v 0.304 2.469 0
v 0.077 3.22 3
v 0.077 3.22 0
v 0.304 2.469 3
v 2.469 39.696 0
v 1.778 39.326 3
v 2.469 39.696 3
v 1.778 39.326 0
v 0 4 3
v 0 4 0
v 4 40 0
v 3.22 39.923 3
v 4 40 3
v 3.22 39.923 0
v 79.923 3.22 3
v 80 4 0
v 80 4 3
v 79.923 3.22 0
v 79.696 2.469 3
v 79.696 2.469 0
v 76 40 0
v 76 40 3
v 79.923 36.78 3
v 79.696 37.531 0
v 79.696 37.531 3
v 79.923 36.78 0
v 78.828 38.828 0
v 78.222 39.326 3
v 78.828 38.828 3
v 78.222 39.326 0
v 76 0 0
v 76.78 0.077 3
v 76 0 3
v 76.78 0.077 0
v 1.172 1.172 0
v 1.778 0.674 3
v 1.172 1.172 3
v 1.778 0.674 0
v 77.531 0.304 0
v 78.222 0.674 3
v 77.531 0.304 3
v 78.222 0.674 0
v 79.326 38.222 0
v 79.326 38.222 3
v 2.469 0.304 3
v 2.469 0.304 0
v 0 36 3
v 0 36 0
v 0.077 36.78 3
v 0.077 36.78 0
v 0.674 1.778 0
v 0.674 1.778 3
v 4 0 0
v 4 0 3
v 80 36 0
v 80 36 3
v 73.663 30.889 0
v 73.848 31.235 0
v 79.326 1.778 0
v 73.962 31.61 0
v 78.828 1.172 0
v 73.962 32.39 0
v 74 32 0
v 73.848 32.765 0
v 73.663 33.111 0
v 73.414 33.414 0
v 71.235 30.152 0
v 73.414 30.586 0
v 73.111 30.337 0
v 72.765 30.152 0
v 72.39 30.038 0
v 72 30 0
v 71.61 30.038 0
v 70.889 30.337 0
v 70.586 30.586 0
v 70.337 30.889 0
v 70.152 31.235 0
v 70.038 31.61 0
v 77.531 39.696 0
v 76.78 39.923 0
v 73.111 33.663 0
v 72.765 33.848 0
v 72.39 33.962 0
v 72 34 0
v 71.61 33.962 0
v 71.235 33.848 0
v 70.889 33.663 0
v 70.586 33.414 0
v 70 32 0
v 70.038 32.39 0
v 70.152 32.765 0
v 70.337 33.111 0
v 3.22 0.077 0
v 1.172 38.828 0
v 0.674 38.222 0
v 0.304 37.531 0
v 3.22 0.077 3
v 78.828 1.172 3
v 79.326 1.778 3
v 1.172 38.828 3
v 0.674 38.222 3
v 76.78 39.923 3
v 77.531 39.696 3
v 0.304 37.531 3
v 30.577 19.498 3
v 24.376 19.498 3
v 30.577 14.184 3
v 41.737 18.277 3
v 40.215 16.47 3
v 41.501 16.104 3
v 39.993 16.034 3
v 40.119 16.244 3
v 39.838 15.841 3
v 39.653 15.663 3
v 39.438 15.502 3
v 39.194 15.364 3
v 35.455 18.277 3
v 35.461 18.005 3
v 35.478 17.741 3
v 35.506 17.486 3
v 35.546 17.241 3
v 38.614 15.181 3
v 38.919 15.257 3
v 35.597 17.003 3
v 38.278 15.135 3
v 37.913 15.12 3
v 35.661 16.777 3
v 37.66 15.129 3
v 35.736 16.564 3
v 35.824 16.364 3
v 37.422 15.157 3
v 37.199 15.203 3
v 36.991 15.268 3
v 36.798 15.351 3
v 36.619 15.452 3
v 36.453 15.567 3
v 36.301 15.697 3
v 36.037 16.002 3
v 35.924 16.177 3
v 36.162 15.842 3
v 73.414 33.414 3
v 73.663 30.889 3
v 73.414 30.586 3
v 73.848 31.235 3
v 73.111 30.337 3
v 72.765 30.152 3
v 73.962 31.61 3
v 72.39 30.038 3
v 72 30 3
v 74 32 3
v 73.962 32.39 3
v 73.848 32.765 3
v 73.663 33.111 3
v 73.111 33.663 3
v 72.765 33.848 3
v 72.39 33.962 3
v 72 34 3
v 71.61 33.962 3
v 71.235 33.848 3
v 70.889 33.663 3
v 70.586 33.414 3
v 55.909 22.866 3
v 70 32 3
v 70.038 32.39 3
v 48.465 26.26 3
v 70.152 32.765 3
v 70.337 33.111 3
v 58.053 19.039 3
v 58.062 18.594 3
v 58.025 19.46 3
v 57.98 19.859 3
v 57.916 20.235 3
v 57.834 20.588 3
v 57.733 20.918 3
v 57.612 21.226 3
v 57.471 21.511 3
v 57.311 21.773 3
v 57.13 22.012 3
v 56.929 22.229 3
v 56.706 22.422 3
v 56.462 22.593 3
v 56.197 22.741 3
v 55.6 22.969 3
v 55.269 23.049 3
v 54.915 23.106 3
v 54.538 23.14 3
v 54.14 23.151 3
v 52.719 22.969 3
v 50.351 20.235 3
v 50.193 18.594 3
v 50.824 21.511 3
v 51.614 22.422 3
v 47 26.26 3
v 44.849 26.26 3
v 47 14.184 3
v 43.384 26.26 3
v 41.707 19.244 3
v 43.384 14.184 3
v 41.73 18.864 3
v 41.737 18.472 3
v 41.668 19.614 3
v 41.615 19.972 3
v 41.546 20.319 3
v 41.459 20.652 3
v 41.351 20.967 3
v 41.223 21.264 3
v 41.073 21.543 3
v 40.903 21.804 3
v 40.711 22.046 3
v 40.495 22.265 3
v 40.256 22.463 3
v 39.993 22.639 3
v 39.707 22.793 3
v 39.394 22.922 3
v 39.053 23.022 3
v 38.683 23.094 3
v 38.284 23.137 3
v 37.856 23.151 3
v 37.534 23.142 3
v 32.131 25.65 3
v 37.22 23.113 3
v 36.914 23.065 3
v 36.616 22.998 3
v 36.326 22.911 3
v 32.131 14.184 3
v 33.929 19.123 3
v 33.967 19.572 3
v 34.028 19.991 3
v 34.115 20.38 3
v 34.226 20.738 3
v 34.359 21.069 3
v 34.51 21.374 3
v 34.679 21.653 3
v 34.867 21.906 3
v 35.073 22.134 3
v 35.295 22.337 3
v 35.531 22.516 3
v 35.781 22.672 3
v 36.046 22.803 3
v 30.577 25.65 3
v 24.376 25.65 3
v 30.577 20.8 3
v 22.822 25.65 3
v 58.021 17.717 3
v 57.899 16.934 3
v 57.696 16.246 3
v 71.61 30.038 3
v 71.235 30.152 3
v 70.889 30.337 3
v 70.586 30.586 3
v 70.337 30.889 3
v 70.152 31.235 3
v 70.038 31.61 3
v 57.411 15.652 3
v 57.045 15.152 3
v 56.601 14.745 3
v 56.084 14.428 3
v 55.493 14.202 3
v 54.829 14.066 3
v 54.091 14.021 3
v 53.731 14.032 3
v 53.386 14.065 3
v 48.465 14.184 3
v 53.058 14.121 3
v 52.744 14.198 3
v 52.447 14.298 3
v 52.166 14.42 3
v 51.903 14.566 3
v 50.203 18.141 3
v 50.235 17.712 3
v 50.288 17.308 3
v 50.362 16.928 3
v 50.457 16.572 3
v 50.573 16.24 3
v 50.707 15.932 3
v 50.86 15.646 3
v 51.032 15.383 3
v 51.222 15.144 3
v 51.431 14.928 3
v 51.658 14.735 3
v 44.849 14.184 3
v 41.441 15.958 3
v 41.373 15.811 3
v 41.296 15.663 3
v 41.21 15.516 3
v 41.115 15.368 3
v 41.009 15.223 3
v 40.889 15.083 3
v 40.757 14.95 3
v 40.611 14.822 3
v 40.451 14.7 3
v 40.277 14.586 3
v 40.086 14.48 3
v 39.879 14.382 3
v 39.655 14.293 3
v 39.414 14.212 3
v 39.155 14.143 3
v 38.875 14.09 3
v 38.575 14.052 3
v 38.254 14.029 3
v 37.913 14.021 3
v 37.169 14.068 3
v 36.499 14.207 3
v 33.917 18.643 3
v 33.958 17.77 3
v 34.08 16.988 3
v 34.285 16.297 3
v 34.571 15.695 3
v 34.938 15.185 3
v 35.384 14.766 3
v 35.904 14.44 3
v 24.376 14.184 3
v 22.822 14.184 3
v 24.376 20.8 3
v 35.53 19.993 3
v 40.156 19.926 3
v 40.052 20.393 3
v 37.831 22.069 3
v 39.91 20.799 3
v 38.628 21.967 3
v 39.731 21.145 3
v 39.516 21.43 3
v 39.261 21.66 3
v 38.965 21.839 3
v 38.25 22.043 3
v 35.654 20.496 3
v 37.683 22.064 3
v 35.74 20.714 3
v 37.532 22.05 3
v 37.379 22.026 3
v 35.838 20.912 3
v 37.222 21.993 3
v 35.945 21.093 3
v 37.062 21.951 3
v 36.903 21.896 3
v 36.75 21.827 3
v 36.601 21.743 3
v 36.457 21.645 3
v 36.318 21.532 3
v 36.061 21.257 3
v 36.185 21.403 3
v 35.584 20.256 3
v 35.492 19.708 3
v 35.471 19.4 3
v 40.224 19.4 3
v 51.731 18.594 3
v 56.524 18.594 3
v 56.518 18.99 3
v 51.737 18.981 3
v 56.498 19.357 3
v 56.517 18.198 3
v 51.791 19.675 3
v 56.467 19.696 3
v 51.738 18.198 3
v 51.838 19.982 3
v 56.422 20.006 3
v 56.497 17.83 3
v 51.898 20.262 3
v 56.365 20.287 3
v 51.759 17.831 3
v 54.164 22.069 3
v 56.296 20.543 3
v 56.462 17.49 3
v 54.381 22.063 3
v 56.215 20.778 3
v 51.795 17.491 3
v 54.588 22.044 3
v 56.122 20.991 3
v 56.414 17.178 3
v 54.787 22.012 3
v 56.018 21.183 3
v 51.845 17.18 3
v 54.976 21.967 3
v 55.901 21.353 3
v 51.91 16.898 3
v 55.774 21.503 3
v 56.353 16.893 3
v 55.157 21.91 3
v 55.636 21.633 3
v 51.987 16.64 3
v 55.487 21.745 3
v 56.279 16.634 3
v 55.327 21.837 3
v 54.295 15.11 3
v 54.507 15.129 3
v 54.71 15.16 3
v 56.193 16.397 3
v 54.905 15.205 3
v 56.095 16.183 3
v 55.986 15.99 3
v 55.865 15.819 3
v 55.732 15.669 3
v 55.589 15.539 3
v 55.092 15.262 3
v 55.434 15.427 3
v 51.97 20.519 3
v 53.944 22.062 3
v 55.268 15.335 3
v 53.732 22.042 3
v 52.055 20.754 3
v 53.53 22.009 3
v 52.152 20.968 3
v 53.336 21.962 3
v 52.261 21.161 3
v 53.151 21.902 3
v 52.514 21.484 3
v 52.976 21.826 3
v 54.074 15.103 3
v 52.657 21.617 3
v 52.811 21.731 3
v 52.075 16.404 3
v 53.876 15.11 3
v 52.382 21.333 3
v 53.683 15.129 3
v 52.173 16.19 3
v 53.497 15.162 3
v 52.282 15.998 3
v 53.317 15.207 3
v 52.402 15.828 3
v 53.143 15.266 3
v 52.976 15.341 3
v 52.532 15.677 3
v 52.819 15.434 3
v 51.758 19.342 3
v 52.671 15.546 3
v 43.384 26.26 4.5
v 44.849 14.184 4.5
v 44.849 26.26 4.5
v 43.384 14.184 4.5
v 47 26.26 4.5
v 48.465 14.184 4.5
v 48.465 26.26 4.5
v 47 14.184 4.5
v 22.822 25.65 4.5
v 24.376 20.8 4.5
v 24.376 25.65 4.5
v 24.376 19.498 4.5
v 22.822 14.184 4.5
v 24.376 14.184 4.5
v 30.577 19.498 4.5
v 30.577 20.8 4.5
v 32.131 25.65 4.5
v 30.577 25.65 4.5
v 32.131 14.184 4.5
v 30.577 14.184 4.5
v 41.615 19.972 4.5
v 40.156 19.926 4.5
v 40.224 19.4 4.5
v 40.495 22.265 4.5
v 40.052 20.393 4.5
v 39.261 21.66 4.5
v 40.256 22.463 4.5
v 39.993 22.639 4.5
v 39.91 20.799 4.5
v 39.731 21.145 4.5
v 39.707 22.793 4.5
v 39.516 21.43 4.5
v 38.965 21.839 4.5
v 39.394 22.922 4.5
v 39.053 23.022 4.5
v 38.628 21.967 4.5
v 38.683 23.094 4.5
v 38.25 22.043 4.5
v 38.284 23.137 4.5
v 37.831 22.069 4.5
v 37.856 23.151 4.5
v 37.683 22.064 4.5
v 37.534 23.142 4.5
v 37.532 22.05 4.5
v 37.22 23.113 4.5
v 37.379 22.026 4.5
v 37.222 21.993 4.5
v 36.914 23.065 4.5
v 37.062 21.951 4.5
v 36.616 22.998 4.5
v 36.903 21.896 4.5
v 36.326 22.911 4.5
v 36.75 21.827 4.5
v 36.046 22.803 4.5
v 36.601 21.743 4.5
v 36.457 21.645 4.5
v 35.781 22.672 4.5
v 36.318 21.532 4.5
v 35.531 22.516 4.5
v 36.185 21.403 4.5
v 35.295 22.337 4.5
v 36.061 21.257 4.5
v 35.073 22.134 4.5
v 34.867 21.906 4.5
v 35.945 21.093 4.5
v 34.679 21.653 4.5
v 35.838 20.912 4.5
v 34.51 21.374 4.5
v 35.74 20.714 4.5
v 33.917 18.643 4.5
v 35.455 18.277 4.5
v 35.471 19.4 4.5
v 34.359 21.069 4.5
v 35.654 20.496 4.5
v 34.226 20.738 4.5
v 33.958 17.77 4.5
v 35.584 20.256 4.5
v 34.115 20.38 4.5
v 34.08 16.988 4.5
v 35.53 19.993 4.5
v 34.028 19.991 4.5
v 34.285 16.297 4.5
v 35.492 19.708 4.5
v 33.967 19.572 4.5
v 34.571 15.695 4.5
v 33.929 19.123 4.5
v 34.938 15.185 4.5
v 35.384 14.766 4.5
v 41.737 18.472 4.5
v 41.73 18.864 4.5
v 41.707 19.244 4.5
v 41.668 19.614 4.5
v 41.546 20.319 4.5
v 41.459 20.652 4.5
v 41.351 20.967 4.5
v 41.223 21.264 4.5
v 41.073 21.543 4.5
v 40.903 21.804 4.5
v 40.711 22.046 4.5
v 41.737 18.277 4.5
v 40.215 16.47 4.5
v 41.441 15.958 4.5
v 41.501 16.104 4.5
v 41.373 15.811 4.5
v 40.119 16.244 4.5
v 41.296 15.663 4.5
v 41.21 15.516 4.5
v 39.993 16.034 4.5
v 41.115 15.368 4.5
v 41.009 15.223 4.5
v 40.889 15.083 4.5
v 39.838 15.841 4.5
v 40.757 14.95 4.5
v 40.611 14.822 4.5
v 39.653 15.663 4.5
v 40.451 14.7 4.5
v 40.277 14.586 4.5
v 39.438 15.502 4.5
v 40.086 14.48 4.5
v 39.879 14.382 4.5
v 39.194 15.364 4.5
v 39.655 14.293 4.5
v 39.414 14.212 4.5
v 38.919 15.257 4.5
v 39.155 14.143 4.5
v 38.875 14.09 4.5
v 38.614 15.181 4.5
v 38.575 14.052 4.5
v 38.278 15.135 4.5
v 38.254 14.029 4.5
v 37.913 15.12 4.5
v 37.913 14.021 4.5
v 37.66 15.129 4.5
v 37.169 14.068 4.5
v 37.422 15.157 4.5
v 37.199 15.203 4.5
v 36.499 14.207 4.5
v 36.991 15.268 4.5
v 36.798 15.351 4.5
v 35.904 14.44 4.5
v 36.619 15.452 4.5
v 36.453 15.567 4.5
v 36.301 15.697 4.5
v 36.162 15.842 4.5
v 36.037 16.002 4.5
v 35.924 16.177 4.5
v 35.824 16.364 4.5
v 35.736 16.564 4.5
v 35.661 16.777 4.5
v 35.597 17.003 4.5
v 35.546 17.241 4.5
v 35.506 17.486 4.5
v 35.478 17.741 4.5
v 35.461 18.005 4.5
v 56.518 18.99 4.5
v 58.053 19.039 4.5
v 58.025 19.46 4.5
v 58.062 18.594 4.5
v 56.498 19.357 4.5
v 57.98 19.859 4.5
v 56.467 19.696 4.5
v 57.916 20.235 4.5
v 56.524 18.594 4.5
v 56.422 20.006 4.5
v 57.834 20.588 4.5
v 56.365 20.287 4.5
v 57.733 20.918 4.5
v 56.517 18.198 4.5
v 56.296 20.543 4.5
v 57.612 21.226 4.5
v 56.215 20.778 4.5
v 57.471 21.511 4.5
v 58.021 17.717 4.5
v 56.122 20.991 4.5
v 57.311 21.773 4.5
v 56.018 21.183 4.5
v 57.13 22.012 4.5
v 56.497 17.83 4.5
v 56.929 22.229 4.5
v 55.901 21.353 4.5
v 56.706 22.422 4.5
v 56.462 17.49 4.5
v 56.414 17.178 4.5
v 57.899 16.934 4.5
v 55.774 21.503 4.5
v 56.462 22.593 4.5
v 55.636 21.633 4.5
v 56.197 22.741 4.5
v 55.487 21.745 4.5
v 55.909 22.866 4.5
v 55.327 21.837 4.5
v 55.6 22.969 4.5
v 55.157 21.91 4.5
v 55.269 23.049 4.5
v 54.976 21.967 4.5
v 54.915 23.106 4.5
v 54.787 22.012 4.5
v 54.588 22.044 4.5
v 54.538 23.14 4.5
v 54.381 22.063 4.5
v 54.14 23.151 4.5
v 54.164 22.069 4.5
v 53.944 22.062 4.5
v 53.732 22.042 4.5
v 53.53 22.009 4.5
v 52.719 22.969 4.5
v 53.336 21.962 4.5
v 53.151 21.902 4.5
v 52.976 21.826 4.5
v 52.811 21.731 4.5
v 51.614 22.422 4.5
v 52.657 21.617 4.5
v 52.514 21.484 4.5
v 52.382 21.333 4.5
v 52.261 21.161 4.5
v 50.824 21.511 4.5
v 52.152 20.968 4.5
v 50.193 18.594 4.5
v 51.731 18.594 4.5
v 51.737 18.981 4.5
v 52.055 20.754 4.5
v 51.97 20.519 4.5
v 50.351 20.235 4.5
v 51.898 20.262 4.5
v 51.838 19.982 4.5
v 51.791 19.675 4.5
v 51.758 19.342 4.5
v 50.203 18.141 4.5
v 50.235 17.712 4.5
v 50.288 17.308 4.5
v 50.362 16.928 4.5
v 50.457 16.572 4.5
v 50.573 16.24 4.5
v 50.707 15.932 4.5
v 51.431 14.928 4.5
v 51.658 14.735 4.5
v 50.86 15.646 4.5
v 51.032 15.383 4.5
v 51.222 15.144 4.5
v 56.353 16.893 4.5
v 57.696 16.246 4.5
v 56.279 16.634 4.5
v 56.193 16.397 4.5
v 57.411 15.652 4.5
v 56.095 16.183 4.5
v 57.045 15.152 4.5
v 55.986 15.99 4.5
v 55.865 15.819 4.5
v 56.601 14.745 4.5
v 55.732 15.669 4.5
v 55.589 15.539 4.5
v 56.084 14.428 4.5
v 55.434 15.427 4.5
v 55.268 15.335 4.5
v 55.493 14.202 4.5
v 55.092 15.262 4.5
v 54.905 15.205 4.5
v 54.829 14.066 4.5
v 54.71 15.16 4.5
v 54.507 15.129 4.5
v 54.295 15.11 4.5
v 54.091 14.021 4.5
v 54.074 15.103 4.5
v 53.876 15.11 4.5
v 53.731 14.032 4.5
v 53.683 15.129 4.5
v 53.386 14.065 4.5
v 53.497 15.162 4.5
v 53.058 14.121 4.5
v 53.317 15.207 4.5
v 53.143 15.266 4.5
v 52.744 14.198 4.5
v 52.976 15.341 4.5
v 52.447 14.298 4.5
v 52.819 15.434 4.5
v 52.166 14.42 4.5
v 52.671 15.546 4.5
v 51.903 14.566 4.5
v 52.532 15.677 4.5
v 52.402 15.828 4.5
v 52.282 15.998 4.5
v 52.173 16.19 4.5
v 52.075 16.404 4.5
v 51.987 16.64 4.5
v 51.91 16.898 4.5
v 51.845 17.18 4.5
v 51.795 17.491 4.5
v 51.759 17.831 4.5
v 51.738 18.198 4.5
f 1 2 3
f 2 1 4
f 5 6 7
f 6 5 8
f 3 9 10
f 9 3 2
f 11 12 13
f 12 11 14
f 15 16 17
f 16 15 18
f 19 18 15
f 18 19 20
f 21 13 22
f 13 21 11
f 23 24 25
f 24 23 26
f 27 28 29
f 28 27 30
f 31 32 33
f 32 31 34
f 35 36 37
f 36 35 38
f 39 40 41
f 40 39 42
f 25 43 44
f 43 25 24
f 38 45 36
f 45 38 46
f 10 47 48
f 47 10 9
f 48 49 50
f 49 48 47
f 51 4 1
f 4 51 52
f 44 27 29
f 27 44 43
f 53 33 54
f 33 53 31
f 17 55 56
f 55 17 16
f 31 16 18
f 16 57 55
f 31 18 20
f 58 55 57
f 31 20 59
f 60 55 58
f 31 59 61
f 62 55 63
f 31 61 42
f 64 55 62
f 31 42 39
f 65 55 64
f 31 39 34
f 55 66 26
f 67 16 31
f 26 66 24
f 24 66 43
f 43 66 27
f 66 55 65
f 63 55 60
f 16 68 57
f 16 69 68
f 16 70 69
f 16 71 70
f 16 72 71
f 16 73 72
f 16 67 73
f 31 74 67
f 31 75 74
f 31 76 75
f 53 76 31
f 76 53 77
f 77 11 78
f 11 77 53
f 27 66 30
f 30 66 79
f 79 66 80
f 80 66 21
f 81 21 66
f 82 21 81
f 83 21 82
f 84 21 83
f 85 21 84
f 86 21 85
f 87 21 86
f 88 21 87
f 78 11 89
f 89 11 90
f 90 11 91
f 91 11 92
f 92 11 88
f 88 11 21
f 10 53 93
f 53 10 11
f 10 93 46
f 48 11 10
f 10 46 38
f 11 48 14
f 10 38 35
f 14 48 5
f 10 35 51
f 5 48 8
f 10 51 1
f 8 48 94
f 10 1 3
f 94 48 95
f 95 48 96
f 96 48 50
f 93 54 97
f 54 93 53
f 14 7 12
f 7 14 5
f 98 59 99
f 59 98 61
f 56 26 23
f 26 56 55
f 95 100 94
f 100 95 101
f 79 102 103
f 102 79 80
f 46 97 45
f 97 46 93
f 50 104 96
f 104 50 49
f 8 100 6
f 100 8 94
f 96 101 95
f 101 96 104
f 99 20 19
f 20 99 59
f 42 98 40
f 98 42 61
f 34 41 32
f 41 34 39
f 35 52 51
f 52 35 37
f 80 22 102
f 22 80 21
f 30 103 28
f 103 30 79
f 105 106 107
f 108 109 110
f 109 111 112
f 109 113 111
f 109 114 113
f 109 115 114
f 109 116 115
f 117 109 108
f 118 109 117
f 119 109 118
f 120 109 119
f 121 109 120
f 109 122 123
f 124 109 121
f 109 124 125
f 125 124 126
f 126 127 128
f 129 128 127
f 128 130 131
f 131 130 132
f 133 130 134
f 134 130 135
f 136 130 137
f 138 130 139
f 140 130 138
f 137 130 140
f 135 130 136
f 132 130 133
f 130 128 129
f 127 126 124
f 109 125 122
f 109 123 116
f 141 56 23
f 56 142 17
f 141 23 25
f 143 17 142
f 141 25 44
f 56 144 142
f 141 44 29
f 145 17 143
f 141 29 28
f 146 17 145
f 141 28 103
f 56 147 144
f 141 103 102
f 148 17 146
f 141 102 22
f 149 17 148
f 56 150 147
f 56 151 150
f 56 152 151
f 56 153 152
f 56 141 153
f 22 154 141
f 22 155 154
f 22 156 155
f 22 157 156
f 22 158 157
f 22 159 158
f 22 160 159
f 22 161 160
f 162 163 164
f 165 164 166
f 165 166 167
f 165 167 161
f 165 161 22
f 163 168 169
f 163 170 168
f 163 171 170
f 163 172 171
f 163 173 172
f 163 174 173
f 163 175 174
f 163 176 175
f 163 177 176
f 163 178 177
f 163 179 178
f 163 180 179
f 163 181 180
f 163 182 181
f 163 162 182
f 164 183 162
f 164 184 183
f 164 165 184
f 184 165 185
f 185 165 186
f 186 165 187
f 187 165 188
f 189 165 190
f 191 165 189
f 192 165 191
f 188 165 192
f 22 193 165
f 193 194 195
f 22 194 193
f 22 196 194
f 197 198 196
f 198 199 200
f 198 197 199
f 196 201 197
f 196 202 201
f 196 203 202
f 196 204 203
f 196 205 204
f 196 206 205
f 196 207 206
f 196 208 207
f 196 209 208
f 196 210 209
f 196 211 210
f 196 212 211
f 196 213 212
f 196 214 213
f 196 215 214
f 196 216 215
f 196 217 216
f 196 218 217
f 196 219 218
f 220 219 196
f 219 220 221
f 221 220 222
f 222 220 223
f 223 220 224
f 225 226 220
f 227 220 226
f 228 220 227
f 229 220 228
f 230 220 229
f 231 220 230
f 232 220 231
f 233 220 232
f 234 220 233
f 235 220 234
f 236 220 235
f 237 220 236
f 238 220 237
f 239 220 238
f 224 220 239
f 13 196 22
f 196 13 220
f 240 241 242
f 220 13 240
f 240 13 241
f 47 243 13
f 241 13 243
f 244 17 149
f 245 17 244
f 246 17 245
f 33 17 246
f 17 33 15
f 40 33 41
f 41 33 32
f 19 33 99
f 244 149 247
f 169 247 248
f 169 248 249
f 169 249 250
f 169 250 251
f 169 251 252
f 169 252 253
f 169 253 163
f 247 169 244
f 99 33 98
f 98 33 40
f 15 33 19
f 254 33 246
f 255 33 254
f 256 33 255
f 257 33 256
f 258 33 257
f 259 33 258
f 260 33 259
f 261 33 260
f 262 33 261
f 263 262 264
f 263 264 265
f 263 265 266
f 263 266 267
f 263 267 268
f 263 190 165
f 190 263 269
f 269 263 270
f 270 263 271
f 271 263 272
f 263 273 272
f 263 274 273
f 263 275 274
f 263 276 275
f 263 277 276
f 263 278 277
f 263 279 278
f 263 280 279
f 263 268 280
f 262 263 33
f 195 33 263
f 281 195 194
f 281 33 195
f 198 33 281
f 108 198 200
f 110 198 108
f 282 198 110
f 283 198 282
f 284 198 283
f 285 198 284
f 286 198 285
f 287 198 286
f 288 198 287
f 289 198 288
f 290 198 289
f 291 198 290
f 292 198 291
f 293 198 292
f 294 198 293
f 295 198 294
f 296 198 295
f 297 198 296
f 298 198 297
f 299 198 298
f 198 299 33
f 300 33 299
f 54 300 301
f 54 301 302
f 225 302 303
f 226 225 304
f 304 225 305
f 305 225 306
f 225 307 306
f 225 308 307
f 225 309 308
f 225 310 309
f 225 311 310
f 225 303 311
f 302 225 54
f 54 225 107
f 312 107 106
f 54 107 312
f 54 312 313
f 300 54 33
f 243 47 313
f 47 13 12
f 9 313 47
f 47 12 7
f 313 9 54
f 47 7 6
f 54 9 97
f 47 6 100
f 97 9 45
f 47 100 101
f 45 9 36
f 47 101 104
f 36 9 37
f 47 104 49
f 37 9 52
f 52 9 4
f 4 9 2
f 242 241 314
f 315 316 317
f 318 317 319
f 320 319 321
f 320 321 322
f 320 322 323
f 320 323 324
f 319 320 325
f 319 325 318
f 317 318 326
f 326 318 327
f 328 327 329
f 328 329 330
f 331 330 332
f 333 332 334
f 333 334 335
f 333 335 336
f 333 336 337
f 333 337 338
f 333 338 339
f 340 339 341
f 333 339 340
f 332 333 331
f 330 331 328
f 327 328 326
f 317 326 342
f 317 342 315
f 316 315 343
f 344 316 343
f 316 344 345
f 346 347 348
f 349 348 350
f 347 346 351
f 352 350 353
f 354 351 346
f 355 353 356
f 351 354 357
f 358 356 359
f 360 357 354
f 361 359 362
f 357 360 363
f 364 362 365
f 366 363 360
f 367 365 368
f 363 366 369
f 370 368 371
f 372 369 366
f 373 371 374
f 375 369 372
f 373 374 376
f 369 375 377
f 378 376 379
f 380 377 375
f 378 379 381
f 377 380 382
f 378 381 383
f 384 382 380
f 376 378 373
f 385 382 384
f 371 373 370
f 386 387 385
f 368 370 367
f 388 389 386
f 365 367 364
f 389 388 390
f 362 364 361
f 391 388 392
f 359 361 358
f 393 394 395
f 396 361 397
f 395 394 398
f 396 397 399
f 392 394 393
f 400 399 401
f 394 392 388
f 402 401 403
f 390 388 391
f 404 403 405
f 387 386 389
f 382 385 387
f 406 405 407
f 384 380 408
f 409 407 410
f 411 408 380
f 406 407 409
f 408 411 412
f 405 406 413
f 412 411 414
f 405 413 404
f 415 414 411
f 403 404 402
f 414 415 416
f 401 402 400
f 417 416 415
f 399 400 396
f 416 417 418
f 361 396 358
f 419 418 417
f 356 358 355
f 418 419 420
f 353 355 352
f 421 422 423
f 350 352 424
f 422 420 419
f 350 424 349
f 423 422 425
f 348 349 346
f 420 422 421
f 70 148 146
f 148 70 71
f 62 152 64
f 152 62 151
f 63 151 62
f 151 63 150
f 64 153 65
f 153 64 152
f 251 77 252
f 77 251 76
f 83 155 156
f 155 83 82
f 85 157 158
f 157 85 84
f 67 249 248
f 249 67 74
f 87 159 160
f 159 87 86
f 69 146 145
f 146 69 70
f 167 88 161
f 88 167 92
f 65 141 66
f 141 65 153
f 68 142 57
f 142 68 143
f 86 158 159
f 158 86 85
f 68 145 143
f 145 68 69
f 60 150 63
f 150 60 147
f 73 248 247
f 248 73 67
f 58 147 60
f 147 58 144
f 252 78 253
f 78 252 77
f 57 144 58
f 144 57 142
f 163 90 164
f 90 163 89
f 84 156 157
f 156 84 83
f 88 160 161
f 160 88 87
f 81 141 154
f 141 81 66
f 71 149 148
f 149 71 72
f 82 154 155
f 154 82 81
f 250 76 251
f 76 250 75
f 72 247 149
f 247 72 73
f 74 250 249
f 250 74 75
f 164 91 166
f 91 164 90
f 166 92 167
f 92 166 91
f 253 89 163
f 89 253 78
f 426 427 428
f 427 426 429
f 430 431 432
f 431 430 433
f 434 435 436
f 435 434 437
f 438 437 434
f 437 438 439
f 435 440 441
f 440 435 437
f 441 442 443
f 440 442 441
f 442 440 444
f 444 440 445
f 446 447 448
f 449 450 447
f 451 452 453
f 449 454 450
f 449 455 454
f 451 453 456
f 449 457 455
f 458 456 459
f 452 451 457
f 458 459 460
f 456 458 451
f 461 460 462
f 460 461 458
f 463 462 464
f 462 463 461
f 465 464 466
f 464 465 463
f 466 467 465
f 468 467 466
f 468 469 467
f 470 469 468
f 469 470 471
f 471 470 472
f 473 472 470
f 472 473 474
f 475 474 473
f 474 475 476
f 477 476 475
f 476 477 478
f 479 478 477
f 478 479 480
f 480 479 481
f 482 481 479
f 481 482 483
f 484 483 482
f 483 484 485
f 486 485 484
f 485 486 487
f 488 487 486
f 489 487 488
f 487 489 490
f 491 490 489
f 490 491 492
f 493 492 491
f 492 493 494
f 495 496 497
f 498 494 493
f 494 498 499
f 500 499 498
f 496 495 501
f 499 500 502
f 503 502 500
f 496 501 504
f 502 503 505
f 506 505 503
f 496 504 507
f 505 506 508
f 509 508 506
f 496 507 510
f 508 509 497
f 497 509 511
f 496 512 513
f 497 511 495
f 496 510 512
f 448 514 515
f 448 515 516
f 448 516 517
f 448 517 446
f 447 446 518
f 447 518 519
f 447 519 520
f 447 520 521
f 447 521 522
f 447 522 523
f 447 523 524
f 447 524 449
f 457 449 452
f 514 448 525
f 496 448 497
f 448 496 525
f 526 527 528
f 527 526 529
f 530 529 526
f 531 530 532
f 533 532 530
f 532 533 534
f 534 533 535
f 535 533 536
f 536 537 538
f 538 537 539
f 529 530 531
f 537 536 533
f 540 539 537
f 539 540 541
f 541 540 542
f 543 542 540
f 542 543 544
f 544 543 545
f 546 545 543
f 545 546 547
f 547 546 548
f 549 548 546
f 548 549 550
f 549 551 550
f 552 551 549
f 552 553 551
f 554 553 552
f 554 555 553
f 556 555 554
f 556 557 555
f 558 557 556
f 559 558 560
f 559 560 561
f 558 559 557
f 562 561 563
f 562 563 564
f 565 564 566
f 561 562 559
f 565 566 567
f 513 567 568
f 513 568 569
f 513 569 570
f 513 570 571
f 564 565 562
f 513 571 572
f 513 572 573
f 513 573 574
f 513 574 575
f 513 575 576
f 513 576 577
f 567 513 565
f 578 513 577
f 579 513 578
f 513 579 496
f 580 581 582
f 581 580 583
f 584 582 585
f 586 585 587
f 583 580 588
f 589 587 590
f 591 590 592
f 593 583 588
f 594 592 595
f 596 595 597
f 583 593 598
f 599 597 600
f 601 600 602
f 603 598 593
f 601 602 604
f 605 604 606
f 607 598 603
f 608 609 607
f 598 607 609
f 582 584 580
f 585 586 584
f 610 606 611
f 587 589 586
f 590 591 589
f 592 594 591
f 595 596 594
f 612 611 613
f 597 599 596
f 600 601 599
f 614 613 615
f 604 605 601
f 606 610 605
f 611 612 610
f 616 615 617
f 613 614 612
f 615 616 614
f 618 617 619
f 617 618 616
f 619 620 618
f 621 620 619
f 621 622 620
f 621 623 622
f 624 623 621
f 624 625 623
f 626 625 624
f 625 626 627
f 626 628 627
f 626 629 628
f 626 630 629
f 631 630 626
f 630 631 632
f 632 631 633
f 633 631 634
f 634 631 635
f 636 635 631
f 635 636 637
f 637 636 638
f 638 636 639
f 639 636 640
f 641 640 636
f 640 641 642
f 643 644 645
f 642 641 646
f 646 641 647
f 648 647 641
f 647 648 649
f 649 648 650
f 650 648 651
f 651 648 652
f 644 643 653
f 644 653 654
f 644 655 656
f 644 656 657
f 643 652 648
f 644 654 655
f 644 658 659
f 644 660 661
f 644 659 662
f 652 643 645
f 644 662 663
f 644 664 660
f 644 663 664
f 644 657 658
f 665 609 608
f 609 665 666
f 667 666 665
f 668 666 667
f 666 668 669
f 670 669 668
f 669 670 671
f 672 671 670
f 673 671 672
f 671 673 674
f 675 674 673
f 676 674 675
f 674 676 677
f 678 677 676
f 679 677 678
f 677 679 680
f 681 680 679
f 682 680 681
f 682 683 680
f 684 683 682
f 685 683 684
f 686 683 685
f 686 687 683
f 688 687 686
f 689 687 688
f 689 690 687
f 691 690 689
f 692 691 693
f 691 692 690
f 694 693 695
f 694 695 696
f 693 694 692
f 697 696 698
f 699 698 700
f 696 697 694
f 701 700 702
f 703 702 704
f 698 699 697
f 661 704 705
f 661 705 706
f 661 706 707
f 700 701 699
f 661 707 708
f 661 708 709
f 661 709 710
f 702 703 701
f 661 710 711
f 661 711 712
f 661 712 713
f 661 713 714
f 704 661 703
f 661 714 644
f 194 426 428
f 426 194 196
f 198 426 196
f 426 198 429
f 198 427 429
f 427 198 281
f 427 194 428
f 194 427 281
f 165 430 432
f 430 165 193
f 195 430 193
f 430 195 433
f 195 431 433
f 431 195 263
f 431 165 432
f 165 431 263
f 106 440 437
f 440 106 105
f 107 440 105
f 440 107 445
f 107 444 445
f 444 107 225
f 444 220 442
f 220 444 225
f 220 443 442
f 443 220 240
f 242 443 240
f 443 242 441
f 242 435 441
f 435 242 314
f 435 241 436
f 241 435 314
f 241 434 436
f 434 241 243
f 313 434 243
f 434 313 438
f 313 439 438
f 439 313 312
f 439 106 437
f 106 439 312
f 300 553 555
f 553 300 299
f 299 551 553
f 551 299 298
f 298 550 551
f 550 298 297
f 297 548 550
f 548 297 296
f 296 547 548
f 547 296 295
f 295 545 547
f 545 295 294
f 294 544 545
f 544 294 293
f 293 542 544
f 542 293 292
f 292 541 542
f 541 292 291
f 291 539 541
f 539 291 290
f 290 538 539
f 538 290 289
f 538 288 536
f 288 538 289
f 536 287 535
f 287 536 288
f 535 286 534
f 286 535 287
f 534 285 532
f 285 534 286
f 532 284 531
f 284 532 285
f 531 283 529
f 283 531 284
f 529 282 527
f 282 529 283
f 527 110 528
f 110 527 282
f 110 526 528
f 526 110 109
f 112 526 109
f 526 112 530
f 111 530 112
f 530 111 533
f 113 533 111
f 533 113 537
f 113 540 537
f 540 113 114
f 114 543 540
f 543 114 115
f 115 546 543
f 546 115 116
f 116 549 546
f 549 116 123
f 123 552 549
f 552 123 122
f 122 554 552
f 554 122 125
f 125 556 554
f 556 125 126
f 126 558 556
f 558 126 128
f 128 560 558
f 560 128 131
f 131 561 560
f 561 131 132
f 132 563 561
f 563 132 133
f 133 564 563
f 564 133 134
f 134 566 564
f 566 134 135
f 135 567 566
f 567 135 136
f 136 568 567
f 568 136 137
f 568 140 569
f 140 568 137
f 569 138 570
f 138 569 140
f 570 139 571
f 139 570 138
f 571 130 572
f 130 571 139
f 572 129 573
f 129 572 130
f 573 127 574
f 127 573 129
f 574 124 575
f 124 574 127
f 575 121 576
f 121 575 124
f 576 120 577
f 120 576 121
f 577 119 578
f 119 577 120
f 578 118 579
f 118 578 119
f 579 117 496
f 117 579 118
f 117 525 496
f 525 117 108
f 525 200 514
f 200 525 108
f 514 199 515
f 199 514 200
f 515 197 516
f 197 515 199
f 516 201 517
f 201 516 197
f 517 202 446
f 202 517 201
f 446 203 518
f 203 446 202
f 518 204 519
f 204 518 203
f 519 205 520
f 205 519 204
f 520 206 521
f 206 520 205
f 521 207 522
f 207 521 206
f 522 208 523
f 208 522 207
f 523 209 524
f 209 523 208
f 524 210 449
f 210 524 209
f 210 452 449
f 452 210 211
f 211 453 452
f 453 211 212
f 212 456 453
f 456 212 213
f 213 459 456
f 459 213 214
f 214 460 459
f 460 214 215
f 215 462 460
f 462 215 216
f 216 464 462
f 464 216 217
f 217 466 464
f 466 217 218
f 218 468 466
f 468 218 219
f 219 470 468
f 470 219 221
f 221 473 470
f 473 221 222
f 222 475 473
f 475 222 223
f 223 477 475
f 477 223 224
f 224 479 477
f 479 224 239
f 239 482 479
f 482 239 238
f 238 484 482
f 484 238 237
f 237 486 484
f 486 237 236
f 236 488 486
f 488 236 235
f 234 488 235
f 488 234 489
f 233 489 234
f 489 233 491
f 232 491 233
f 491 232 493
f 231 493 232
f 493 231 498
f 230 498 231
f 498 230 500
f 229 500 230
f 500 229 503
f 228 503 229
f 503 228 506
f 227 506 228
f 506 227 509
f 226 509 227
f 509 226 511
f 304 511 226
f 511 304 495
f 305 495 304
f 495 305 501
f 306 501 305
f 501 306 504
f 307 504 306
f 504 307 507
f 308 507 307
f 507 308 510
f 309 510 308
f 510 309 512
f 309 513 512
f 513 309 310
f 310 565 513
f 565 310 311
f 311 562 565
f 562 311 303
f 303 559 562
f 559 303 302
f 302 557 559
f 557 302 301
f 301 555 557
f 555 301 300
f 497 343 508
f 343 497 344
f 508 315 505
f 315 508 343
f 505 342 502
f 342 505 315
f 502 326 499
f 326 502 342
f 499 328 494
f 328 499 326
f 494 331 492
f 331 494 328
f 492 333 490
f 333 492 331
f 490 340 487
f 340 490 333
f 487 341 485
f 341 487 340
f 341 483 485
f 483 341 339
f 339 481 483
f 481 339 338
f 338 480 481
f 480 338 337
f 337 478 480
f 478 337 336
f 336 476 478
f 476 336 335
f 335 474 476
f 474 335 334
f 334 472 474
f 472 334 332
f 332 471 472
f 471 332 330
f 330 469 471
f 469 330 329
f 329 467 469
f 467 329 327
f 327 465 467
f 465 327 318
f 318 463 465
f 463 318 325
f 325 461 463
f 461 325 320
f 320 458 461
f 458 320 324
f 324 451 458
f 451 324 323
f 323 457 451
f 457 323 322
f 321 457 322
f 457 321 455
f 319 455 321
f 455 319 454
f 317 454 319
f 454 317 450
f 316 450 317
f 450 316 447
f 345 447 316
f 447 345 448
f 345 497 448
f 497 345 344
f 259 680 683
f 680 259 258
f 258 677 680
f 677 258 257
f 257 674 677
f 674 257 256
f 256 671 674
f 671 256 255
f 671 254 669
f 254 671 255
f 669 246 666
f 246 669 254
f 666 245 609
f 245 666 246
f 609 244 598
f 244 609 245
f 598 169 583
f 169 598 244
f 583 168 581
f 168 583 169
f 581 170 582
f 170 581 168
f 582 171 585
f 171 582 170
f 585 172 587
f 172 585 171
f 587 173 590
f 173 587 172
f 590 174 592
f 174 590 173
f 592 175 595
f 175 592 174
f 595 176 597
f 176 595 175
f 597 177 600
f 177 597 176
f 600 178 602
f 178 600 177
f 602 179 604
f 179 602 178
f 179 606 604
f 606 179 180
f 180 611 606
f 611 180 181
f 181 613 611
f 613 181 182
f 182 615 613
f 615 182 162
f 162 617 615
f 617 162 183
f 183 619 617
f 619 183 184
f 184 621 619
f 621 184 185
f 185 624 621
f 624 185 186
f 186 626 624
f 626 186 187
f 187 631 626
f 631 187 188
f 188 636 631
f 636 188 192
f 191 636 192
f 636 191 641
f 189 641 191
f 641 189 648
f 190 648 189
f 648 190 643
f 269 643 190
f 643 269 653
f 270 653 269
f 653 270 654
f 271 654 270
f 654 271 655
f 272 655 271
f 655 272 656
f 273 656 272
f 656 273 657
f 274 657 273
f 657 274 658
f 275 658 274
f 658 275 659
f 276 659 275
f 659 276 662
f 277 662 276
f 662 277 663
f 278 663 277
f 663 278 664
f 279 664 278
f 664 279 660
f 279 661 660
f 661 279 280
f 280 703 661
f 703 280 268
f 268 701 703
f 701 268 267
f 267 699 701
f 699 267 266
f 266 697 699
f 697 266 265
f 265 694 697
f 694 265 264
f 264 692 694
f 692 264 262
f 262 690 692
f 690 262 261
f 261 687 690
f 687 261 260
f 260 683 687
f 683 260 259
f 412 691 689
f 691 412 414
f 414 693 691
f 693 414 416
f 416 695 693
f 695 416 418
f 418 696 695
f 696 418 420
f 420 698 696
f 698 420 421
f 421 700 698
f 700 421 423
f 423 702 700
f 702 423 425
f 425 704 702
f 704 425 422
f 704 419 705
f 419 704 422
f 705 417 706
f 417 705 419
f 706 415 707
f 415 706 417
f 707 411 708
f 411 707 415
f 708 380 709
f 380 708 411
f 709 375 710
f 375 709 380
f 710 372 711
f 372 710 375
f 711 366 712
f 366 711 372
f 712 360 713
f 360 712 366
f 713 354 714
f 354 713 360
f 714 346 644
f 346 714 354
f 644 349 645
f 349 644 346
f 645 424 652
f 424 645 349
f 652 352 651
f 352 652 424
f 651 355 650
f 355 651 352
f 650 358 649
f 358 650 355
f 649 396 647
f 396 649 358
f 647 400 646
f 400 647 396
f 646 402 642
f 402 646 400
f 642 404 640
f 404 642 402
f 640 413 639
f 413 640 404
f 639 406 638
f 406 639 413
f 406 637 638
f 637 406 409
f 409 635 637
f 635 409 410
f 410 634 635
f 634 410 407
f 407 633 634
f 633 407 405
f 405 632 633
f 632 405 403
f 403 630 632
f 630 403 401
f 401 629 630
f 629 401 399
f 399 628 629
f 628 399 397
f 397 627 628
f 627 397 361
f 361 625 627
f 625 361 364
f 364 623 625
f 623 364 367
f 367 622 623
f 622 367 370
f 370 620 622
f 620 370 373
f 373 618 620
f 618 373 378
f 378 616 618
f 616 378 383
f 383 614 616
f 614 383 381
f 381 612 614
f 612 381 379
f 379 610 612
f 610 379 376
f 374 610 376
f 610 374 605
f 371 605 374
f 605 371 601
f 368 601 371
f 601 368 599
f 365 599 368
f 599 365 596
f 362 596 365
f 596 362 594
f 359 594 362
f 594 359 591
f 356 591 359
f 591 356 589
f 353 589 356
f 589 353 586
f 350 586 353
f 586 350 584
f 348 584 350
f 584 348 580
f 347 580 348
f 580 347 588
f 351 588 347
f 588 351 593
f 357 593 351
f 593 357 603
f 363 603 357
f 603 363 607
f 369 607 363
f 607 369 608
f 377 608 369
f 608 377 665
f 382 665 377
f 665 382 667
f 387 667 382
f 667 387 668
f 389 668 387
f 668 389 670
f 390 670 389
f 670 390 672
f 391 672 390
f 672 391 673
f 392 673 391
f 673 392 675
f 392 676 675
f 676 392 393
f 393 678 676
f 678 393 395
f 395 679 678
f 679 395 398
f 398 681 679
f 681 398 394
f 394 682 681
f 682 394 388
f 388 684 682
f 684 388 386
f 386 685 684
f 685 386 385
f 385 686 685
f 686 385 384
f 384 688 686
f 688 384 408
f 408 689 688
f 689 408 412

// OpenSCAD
// Qubic wrapper — Gift Tag
// Rounded rectangle with hanging hole and text

message = "Hello";
font_size = 12;
text_depth = 1.5;
base_width = 80;
base_height = 40;
base_thickness = 3;
raised = true;
hole_diameter = 4;
fn = 0;
render_mode = 0;

$fn = fn > 0 ? fn : 32;

corner_r = 4;
hole_r = hole_diameter / 2;
hole_x = base_width - corner_r - hole_r - 2;
hole_y = base_height - corner_r - hole_r - 2;

module rounded_rect(w, h, r) {
    hull() {
        translate([r, r]) circle(r);
        translate([w - r, r]) circle(r);
        translate([r, h - r]) circle(r);
        translate([w - r, h - r]) circle(r);
    }
}

module tag_base() {
    difference() {
        linear_extrude(base_thickness)
            rounded_rect(base_width, base_height, corner_r);
        // Hanging hole
        translate([hole_x, hole_y, -0.5])
            cylinder(h = base_thickness + 1, r = hole_r);
    }
}

if (raised) {
    union() {
        tag_base();
        translate([base_width / 2, base_height / 2, base_thickness])
            linear_extrude(text_depth)
                text(message, size = font_size, halign = "center", valign = "center");
    }
} else {
    difference() {
        tag_base();
        translate([base_width / 2, base_height / 2, base_thickness - text_depth])
            linear_extrude(text_depth + 0.1)
                text(message, size = font_size, halign = "center", valign = "center");
    }
}
